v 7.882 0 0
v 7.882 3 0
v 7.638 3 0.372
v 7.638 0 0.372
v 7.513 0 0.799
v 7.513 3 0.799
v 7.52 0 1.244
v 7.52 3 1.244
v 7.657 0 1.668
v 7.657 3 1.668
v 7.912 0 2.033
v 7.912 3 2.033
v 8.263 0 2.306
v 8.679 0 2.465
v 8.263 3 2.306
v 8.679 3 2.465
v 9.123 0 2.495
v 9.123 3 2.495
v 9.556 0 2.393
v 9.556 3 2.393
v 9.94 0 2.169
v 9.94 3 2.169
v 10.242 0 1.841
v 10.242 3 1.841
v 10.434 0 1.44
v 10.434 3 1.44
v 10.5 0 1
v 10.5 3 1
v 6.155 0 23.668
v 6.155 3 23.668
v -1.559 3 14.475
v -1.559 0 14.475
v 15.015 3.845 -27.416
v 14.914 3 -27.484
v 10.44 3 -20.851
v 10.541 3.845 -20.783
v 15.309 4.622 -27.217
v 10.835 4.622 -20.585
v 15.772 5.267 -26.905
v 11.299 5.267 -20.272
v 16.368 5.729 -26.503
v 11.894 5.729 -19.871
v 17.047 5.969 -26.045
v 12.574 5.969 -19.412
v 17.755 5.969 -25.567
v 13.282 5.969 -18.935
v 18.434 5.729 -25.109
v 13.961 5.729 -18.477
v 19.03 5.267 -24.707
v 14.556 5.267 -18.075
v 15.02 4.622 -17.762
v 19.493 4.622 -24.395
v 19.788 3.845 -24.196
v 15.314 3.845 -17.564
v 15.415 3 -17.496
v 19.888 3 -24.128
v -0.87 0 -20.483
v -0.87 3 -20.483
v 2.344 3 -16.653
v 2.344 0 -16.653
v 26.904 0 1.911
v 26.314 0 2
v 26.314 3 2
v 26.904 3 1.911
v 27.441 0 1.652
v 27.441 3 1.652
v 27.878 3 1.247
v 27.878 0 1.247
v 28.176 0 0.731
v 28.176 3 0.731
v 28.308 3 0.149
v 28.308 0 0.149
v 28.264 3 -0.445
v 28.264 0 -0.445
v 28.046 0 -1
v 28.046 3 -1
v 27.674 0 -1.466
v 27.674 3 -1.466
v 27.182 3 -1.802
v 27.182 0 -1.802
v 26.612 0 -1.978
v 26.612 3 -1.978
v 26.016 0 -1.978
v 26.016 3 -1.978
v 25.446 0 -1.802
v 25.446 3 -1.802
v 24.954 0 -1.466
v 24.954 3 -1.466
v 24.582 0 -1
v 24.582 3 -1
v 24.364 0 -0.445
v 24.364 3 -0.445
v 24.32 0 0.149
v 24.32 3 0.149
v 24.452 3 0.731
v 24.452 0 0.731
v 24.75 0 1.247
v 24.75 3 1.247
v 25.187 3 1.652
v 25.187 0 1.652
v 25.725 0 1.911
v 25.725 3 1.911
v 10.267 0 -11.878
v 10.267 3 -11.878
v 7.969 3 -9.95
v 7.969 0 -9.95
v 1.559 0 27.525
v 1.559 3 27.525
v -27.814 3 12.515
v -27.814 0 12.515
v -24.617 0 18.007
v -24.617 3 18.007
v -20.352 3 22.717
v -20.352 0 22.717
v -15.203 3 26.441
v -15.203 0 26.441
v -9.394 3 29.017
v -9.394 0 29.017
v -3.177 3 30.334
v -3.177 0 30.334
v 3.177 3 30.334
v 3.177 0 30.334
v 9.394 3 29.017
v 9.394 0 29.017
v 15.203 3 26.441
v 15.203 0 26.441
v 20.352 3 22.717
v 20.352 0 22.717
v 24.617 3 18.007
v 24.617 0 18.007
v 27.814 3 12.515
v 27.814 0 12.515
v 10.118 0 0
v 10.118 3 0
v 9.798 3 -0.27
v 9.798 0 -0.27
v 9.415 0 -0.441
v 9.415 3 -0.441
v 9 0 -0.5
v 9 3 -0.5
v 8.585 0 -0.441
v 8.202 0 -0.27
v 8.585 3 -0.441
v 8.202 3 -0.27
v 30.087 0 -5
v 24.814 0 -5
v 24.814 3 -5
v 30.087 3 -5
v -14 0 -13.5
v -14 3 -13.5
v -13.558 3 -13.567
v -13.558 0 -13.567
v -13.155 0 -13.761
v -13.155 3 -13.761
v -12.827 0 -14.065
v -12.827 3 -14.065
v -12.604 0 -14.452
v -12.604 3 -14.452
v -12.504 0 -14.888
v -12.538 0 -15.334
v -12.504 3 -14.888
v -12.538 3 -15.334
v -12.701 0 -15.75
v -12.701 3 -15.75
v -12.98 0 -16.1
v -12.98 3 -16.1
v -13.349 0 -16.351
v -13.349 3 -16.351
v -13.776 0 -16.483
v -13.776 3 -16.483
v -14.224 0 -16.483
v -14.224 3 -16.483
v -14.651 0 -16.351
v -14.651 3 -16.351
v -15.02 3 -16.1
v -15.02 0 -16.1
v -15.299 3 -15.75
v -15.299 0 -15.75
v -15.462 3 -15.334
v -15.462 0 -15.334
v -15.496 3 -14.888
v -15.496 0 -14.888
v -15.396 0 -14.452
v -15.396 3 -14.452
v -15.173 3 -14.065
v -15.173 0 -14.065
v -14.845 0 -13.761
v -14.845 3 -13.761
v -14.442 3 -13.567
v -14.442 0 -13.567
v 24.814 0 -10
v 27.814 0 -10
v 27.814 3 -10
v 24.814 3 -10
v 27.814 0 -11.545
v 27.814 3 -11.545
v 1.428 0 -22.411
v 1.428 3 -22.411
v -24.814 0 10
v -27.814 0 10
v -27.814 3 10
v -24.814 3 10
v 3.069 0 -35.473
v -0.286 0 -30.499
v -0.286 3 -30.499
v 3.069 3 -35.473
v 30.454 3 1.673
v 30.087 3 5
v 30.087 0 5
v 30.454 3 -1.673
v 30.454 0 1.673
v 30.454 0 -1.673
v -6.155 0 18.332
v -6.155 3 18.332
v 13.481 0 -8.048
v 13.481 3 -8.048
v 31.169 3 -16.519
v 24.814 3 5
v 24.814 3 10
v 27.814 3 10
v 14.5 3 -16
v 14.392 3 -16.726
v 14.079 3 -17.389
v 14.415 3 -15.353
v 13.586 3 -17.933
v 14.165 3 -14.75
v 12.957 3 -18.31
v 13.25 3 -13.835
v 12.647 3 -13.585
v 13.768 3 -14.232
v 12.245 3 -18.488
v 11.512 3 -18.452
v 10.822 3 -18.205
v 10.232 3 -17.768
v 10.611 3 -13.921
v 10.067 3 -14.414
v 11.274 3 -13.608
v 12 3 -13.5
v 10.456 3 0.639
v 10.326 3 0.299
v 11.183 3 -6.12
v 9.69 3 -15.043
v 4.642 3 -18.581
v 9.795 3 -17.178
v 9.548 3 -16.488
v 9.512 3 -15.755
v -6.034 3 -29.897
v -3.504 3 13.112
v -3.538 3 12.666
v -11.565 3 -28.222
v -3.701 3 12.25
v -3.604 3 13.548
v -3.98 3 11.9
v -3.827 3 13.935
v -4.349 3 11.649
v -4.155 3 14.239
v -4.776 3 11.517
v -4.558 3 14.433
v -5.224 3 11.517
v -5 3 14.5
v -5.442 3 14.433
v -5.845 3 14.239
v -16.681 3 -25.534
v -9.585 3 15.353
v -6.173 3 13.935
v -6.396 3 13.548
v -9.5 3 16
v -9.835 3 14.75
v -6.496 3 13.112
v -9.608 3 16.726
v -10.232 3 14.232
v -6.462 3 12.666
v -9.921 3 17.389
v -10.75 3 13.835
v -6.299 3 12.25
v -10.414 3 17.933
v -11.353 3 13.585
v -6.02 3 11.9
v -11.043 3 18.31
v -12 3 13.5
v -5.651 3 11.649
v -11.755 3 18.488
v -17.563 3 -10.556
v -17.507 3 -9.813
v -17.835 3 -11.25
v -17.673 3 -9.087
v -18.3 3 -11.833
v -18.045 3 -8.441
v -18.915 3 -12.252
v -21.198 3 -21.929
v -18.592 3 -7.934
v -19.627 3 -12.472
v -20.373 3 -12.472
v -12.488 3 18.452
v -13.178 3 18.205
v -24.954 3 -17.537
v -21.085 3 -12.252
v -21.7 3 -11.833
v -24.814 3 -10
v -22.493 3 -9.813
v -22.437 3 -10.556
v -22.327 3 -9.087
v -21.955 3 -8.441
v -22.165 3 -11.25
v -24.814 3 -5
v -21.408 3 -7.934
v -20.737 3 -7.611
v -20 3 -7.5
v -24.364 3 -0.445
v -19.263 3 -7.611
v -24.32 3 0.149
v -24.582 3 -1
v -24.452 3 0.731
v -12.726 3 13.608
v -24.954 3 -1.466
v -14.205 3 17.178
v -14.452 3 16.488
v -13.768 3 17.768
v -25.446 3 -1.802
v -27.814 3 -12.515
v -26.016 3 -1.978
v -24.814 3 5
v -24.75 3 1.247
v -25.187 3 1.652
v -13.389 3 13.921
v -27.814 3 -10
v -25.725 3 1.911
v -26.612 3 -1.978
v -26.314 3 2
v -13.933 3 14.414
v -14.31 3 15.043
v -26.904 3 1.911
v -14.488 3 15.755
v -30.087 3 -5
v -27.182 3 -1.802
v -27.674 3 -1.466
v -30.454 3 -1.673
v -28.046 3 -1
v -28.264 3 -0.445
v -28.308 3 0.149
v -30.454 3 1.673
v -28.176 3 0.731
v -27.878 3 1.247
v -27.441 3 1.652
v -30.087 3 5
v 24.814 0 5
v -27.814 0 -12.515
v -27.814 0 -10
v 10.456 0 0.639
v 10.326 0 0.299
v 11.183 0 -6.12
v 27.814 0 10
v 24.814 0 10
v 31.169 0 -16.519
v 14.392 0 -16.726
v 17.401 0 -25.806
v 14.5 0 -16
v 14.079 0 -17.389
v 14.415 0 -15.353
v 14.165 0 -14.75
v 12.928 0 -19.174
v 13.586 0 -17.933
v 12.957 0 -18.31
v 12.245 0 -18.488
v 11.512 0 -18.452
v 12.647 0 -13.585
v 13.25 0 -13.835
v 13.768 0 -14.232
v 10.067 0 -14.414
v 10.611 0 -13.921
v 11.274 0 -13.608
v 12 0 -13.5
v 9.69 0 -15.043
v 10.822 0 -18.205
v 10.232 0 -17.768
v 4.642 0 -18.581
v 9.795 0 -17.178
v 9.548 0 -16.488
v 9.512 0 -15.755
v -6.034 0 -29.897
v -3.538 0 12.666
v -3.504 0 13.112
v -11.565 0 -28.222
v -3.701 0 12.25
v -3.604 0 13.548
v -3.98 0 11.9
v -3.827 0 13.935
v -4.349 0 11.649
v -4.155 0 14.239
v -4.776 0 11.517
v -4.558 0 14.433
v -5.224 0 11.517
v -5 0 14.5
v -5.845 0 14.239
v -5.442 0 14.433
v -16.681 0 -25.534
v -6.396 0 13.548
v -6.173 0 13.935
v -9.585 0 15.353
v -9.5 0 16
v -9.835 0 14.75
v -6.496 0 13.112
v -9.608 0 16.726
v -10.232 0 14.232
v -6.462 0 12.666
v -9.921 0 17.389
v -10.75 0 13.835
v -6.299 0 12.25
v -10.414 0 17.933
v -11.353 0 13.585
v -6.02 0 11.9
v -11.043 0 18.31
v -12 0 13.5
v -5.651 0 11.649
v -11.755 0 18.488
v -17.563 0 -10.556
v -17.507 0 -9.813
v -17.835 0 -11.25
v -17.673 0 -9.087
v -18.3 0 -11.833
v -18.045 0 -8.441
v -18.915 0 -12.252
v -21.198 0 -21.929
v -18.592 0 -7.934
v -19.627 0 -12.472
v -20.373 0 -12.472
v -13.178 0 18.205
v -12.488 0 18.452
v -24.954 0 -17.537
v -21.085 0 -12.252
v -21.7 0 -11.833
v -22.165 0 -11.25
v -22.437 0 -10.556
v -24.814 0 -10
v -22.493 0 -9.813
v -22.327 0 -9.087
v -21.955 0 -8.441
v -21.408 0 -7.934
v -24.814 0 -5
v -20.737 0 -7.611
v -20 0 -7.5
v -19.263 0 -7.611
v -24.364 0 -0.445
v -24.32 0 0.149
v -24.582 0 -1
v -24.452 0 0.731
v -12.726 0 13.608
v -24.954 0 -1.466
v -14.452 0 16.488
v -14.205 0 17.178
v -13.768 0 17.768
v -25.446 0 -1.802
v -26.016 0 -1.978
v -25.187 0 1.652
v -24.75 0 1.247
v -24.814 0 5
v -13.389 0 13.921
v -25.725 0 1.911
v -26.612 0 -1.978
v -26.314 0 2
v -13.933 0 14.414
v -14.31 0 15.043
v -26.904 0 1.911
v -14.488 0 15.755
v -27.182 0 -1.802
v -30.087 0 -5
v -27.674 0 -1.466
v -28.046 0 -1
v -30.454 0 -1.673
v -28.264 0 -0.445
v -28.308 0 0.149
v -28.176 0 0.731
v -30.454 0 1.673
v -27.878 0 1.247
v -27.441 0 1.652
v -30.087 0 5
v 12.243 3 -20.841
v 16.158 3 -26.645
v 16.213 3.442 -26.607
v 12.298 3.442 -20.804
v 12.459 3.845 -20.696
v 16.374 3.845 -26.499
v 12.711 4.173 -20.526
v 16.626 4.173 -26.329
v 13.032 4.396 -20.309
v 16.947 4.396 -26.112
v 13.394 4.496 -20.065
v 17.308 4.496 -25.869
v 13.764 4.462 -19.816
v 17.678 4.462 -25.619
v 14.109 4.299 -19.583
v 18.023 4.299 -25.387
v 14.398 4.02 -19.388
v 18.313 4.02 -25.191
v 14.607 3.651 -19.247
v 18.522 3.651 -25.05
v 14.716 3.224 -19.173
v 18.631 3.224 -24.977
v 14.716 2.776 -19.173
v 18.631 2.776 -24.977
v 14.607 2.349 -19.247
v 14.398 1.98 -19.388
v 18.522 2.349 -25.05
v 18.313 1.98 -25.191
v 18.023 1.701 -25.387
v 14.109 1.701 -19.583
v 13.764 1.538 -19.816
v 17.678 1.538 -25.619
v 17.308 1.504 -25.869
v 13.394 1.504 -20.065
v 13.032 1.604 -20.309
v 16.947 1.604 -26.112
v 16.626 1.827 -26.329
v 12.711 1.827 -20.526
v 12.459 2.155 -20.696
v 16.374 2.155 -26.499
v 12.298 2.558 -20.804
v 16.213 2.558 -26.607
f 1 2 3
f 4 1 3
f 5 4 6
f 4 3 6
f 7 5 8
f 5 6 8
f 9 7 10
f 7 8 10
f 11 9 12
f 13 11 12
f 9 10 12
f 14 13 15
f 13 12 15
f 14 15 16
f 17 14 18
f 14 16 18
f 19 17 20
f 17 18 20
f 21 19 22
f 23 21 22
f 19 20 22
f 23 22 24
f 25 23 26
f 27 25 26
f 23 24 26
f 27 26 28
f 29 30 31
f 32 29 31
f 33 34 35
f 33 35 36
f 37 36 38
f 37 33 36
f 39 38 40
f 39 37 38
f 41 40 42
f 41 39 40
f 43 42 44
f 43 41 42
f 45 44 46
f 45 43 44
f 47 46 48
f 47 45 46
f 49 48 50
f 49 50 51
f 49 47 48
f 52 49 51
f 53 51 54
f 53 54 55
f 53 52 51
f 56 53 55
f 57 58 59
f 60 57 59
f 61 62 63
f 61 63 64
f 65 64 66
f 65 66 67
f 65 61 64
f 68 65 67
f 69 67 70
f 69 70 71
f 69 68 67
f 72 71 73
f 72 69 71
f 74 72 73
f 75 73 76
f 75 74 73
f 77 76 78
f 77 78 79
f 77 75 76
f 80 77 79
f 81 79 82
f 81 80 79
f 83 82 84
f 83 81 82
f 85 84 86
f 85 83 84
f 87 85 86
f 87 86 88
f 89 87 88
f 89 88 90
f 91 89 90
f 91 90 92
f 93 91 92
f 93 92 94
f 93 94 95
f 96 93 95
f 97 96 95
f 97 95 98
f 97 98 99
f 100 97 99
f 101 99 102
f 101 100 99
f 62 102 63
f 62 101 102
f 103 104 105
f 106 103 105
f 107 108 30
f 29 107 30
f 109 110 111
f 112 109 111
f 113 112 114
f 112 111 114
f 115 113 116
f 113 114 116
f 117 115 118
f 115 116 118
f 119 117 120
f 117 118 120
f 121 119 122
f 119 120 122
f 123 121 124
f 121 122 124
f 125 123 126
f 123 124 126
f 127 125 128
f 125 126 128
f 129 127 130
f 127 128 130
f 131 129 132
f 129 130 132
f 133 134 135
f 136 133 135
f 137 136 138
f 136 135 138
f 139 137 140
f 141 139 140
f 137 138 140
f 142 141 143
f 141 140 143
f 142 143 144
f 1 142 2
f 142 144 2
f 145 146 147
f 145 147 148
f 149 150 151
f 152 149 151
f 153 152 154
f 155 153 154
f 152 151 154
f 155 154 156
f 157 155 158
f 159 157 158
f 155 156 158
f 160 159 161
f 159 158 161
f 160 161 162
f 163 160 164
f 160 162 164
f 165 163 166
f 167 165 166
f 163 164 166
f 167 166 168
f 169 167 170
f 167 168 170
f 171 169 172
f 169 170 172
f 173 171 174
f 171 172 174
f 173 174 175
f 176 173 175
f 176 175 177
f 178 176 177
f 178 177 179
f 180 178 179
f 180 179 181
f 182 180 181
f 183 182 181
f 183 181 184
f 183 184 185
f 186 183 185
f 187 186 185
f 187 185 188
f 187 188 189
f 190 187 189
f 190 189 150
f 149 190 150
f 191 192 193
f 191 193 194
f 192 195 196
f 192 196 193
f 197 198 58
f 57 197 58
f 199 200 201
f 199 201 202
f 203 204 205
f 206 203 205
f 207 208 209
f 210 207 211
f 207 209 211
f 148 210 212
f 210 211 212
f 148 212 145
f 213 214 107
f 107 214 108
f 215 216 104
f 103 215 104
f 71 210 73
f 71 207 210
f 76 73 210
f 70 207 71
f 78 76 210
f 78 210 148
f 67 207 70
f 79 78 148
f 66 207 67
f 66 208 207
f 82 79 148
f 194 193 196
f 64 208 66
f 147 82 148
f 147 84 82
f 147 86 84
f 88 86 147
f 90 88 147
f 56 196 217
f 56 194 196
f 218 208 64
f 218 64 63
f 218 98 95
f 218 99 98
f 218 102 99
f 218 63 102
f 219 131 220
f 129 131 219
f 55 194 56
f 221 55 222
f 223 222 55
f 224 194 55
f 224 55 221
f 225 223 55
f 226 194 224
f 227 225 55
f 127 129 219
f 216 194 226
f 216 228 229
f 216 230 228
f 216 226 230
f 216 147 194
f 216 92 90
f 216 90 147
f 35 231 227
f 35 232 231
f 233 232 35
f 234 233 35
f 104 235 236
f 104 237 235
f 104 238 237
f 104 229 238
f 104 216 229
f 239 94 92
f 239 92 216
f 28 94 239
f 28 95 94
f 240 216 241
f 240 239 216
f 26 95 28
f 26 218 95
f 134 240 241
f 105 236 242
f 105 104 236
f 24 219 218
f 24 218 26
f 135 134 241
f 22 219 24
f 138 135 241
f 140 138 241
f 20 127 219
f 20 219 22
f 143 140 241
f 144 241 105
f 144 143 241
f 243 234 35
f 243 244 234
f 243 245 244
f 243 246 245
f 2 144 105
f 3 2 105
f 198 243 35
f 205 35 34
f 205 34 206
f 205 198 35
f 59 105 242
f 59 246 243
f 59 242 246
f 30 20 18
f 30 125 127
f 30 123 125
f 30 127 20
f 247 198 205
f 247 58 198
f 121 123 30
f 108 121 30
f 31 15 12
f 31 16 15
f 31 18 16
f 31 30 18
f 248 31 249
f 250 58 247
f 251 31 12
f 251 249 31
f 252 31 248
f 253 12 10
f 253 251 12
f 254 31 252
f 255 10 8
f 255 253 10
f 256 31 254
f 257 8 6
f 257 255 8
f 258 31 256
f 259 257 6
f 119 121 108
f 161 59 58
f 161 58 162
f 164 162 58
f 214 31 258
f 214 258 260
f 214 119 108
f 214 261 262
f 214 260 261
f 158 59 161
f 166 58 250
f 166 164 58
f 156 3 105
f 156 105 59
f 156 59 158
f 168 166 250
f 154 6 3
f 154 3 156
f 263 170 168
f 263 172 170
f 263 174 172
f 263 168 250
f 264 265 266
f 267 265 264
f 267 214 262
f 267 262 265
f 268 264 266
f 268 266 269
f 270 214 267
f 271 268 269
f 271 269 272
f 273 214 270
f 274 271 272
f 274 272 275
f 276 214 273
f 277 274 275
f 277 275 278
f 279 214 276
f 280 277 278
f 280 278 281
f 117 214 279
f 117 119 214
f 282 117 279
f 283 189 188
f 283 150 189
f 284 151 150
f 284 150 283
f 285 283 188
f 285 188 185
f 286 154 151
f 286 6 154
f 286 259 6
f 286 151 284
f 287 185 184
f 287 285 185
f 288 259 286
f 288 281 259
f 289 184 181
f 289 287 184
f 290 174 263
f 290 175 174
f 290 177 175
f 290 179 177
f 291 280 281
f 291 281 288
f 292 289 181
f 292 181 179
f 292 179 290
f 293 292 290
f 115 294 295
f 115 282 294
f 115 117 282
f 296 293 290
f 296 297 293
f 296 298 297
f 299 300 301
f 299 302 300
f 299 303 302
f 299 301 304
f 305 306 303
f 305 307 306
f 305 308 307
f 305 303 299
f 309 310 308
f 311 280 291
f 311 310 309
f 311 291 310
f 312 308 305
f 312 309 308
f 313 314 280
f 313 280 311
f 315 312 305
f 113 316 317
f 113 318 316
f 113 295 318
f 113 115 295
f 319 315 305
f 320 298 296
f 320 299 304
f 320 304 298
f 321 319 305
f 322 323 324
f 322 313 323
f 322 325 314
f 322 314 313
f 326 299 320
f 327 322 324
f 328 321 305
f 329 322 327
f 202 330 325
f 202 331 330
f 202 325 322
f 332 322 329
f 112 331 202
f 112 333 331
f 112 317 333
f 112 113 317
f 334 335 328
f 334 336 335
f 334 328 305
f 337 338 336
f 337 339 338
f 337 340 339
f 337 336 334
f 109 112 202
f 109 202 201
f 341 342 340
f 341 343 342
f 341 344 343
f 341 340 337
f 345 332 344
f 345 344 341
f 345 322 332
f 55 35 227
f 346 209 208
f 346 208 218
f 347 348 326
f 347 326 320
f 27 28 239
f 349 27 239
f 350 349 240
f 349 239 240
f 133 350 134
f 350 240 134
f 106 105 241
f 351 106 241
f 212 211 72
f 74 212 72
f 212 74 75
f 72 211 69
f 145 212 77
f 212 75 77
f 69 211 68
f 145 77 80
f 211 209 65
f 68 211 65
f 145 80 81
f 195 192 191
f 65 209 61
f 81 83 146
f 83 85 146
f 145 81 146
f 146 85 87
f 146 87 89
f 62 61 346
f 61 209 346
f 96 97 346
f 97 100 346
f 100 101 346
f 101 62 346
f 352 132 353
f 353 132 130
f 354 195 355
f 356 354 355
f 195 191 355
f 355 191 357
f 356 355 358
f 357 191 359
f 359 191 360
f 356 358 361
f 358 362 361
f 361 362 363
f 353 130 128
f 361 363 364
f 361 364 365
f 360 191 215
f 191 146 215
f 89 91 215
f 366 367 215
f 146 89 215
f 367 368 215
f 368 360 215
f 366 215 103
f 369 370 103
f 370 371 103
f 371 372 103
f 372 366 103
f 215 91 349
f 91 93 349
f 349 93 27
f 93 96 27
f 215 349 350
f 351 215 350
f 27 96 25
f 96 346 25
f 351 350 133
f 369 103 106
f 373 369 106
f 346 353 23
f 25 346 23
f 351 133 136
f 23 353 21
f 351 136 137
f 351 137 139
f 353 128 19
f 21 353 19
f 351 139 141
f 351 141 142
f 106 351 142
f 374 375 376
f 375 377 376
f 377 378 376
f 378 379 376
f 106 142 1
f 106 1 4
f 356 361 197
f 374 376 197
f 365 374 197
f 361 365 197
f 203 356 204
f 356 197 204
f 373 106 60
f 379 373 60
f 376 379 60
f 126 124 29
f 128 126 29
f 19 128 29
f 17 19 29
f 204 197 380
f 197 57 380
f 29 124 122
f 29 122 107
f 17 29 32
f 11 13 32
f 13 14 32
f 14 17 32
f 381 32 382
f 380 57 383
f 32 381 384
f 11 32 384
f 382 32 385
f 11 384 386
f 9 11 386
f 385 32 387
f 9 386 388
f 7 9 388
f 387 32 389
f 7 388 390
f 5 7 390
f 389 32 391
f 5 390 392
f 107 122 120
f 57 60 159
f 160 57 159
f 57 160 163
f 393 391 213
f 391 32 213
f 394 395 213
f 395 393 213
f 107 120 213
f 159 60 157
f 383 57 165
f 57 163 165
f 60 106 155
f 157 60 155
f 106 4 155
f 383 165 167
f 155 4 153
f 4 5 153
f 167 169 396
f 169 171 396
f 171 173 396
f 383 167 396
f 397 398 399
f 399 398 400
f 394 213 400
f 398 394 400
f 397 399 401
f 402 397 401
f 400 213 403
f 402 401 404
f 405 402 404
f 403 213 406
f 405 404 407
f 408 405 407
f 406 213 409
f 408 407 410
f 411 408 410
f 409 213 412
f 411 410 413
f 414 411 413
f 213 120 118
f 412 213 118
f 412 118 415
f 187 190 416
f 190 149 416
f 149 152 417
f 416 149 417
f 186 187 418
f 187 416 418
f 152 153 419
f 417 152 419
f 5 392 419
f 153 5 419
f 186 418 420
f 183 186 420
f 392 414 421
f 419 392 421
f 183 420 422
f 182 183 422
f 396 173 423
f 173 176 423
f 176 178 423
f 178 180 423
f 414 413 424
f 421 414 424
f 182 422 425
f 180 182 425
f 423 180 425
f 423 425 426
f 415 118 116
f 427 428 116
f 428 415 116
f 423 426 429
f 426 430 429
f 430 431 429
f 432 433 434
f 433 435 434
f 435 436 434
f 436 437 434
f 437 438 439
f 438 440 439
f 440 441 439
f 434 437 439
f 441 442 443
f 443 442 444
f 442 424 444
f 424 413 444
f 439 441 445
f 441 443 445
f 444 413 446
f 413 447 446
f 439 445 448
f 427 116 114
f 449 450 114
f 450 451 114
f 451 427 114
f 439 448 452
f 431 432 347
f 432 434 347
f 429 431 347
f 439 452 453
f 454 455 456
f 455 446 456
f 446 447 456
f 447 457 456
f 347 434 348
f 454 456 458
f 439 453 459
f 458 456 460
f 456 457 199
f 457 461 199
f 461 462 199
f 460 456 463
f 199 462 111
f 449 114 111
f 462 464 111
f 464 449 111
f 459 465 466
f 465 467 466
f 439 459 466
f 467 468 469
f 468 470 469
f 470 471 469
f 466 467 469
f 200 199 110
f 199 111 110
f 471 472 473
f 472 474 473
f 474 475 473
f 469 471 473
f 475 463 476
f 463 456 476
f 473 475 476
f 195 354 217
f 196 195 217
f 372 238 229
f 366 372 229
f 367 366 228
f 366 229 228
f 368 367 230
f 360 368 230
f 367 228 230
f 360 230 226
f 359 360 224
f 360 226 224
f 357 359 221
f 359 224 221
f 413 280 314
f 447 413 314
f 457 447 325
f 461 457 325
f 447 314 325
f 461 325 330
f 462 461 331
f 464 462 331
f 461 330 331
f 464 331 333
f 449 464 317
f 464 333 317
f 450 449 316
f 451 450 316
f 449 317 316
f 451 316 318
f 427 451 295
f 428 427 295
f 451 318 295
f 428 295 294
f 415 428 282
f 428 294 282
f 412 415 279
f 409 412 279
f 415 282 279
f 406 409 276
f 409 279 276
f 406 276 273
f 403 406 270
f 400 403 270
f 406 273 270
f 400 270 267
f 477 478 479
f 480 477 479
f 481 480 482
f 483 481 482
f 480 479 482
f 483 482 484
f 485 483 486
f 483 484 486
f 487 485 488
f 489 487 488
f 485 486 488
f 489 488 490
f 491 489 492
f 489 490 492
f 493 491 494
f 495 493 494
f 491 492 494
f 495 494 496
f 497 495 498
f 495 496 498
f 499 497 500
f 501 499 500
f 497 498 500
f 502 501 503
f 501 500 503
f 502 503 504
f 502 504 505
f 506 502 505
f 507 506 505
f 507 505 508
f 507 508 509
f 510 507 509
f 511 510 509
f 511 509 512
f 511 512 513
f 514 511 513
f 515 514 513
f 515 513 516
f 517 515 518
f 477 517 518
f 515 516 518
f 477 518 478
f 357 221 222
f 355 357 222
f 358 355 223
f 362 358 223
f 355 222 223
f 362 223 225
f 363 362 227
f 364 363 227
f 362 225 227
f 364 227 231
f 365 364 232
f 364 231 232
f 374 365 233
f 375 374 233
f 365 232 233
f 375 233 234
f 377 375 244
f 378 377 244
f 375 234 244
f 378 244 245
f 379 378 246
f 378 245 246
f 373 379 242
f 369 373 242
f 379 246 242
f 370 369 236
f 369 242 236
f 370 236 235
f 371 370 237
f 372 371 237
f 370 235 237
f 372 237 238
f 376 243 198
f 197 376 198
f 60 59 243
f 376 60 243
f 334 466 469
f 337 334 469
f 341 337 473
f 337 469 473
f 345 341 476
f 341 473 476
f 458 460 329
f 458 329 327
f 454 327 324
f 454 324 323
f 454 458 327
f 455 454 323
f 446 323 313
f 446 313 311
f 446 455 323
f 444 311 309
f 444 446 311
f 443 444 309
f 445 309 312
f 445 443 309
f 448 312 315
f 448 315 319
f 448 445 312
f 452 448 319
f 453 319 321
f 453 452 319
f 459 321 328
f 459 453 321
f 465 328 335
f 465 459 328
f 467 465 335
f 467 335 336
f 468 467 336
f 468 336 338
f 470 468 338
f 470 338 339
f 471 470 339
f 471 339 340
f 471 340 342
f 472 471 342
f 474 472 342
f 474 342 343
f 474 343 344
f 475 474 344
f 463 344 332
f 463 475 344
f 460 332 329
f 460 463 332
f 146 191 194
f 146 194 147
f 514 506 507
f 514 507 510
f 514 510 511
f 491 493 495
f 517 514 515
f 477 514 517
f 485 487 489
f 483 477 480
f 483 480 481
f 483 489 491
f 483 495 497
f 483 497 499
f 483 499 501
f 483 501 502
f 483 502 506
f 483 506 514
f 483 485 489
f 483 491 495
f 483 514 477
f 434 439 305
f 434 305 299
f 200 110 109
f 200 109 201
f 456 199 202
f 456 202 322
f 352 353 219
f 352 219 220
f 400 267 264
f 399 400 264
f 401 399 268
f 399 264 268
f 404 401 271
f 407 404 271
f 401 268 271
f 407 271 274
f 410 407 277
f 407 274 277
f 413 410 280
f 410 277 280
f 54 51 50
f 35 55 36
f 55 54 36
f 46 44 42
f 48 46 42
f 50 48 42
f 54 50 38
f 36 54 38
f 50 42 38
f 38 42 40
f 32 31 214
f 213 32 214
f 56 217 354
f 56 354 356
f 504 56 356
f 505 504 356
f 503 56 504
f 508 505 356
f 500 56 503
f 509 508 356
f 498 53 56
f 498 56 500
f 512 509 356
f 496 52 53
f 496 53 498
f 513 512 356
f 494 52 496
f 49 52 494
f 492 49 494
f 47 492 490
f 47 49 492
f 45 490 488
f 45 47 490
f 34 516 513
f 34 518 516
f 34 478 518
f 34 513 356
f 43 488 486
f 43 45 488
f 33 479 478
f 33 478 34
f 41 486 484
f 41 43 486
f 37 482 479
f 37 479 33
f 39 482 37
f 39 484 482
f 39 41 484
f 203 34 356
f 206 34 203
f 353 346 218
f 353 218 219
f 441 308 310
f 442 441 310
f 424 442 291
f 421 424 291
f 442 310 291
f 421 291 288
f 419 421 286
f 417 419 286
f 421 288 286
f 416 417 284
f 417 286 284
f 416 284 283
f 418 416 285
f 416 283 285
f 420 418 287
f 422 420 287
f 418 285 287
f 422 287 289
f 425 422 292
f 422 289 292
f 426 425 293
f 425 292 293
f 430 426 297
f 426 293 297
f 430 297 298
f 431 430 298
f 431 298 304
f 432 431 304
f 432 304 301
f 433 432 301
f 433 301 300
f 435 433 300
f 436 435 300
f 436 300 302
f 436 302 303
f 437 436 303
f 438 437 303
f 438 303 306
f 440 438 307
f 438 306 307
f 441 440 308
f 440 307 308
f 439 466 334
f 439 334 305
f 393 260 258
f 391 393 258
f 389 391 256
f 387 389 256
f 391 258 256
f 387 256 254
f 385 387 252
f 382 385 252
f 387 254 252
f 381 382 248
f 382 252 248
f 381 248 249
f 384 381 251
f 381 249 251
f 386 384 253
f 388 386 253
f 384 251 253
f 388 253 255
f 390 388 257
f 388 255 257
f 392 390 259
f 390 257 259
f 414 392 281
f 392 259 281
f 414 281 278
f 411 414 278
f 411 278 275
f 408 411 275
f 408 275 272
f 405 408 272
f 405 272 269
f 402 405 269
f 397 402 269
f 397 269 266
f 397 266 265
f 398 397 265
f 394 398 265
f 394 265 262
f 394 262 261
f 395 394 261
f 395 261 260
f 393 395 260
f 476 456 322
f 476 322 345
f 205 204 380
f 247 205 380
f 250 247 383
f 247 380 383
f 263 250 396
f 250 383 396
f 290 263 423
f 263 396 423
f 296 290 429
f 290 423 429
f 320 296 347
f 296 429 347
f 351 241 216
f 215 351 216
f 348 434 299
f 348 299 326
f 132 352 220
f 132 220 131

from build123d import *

# Parameters (mm, degrees)
CROQUIS1_R              = 30.5
SALIENTE_EXTRUIR1_DEPTH = 3
CORTAR_EXTRUIR3_START   = -4
CORTAR_EXTRUIR3_DEPTH   = 4
CORTAR_EXTRUIR5_DEPTH   = 4
CROQUIS8_R              = 1.5
CORTAR_EXTRUIR6_DEPTH   = 10
CORTAR_EXTRUIR8_START   = -3
CROQUIS10_R             = 2
CORTAR_EXTRUIR8_DEPTH   = 3
CROQUIS11_R             = 2.5
CORTAR_EXTRUIR9_DEPTH   = 3
CROQUIS13_W             = 33.894616986
CROQUIS13_H             = 3
SALIENTE_EXTRUIR2_DEPTH = 6
CROQUIS14_R             = 3
SALIENTE_EXTRUIR3_DEPTH = 8
CROQUIS17_R             = 1.5
CORTAR_EXTRUIR10_DEPTH  = 7


with BuildPart() as part:
    # Croquis1 → Saliente-Extruir1 (new body)
    with BuildSketch(Plane(origin=(0, 0, 0), x_dir=(1, 0, 0), z_dir=(0, 1, 0))):
        with Locations(Location((0, 0, 0), (0, 0, 270))):
            Circle(CROQUIS1_R)
    extrude(amount=SALIENTE_EXTRUIR1_DEPTH)

    # Croquis5 → Cortar-Extruir3 (cut)
    with BuildSketch(Plane(origin=(0, 3, 0), x_dir=(1, 0, 0), z_dir=(0, 1, 0)).offset(CORTAR_EXTRUIR3_START)):
        with BuildLine():
            Line((28.814059068, 5), (30.087372767, 5))
            ThreePointArc((30.087372767, 5), (29.556634924, 7.526973624), (28.814059068, 10))
            Line((28.814059068, 10), (24.814059068, 10))
            Line((24.814059068, 10), (24.814059068, 5))
            Line((24.814059068, 5), (28.814059068, 5))
        make_face()
        with BuildLine():
            Line((30.087372767, -5), (28.814059068, -5))
            Line((28.814059068, -5), (24.814059068, -5))
            Line((24.814059068, -5), (24.814059068, -10))
            Line((24.814059068, -10), (28.814059068, -10))
            ThreePointArc((28.814059068, -10), (29.556634924, -7.526973624), (30.087372767, -5))
        make_face()
        with BuildLine():
            Line((-24.814059068, 5), (-24.814059068, 10))
            Line((-24.814059068, 10), (-28.814059068, 10))
            ThreePointArc((-28.814059068, 10), (-29.556634924, 7.526973624), (-30.087372767, 5))
            Line((-30.087372767, 5), (-28.814059068, 5))
            Line((-28.814059068, 5), (-24.814059068, 5))
        make_face()
        with BuildLine():
            Line((-28.814059068, -10), (-24.814059068, -10))
            Line((-24.814059068, -10), (-24.814059068, -5))
            Line((-24.814059068, -5), (-28.814059068, -5))
            Line((-28.814059068, -5), (-30.087372767, -5))
            ThreePointArc((-30.087372767, -5), (-29.556634924, -7.526973624), (-28.814059068, -10))
        make_face()
    extrude(amount=CORTAR_EXTRUIR3_DEPTH, mode=Mode.SUBTRACT)

    # Croquis7 → Cortar-Extruir5 (cut)
    with BuildSketch(Plane(origin=(0, 3, 0), x_dir=(1, 0, 0), z_dir=(0, 1, 0))):
        Polygon((1.428390211, 22.411430151), (-0.869743118, 20.483067322), (2.34419493, 16.652845106), (4.642328259, 18.581207935), align=None)
        Polygon((10.266719844, 11.878319058), (7.968586515, 9.949956229), (9.575555539, 8.034845121), (11.182524563, 6.119734013), (13.480657893, 8.048096842), align=None)
    extrude(amount=-CORTAR_EXTRUIR5_DEPTH, mode=Mode.SUBTRACT)

    # Croquis8 → Cortar-Extruir6 (cut)
    with BuildSketch(Plane(origin=(0, 3, 0), x_dir=(1, 0, 0), z_dir=(0, 1, 0))):
        Polygon((-6.154858987, -18.33209617), (1.558592329, -27.524629488), (6.154858987, -23.66790383), (-1.558592329, -14.475370512), align=None)
        with BuildLine():
            ThreePointArc((-9.5, -16), (-10.232233047, -14.232233047), (-12, -13.5))
            ThreePointArc((-12, -13.5), (-13.767766953, -17.767766953), (-9.5, -16))
        make_face()
        with BuildLine():
            ThreePointArc((14.5, 16), (10.232233047, 17.767766953), (12, 13.5))
            ThreePointArc((12, 13.5), (13.767766953, 14.232233047), (14.5, 16))
        make_face()
        with Locations(Location((-14, 15, 0), (0, 0, 270))):
            Circle(CROQUIS8_R)
        with BuildLine():
            Line((10.118033989, 0), (7.881966011, 0))
            ThreePointArc((7.881966011, 0), (8.464766865, -2.401258538), (10.5, -1))
            ThreePointArc((10.5, -1), (10.401258538, -0.464766865), (10.118033989, 0))
        make_face()
        with BuildLine():
            ThreePointArc((10.118033989, 0), (9, 0.5), (7.881966011, 0))
            Line((7.881966011, 0), (10.118033989, 0))
        make_face()
        with Locations(Location((-5, -13, 0), (0, 0, 270))):
            Circle(CROQUIS8_R)
    extrude(amount=-CORTAR_EXTRUIR6_DEPTH, mode=Mode.SUBTRACT)

    # Croquis10 → Cortar-Extruir8 (cut)
    with BuildSketch(Plane(origin=(0, 3, 0), x_dir=(1, 0, 0), z_dir=(0, 1, 0)).offset(CORTAR_EXTRUIR8_START)):
        with BuildLine():
            Line((-27.814059068, -12.515115586), (-27.814059068, -10))
            Line((-27.814059068, -10), (-28.814059068, -10))
            ThreePointArc((-28.814059068, -10), (-28.341972277, -11.268655974), (-27.814059068, -12.515115586))
        make_face()
        with BuildLine():
            Line((-28.814059068, 10), (-27.814059068, 10))
            Line((-27.814059068, 10), (-27.814059068, 12.515115586))
            ThreePointArc((-27.814059068, 12.515115586), (-28.341972277, 11.268655974), (-28.814059068, 10))
        make_face()
        with BuildLine():
            Line((27.814059069, -10), (27.814059069, -12.515115586))
            ThreePointArc((27.814059069, -12.515115586), (28.341972277, -11.268655974), (28.814059068, -10))
            Line((28.814059068, -10), (27.814059069, -10))
        make_face()
        with BuildLine():
            ThreePointArc((28.814059069, 10), (28.341972277, 11.268655974), (27.814059069, 12.515115586))
            Line((27.814059069, 12.515115586), (27.814059069, 10))
            Line((27.814059069, 10), (28.814059069, 10))
        make_face()
        with Locations(Location((-26.314059068, 0, 0), (0, 0, 270))):
            Circle(CROQUIS10_R)
        with Locations(Location((26.314059069, 0, 0), (0, 0, 270))):
            Circle(CROQUIS10_R)
    extrude(amount=CORTAR_EXTRUIR8_DEPTH, mode=Mode.SUBTRACT)

    # Croquis11 → Cortar-Extruir9 (cut)
    with BuildSketch(Plane(origin=(0, 3, 0), x_dir=(1, 0, 0), z_dir=(0, 1, 0))):
        with BuildLine():
            Line((-1.702166058, 31.453976389), (29.801261699, 10.204646058))
            ThreePointArc((29.801261699, 10.204646058), (17.614576459, 26.114683535), (-1.702166058, 31.453976389))
        make_face()
        with Locations(Location((-20, 10, 0), (0, 0, 270))):
            Circle(CROQUIS11_R)
    extrude(amount=-CORTAR_EXTRUIR9_DEPTH, mode=Mode.SUBTRACT)

    # Croquis13 → Saliente-Extruir2 (add)
    with BuildSketch(Plane(origin=(14.04954782, 0, -20.829311224), x_dir=(-0.8290375725550413, 0, -0.5591929034707476), z_dir=(0.5591929034707475, 0, -0.8290375725550412))):
        with Locations((0.344307973, 1.5)):
            Rectangle(CROQUIS13_W, CROQUIS13_H)
    extrude(amount=SALIENTE_EXTRUIR2_DEPTH)

    # Croquis14 → Saliente-Extruir3 (add)
    with BuildSketch(Plane(origin=(17.404705241, 0, -25.803536659), x_dir=(-0.8290375725550413, 0, -0.5591929034707476), z_dir=(0.5591929034707476, 0, -0.8290375725550413))):
        with Locations((0.004307973, 3)):
            Circle(CROQUIS14_R)
    extrude(amount=-SALIENTE_EXTRUIR3_DEPTH)

    # Croquis17 → Cortar-Extruir10 (cut)
    with BuildSketch(Plane(origin=(17.404705241, 0, -25.803536659), x_dir=(-0.8290375725550413, 0, -0.5591929034707476), z_dir=(0.5591929034707476, 0, -0.8290375725550413))):
        with Locations((0.004307973, 3)):
            Circle(CROQUIS17_R)
    extrude(amount=-CORTAR_EXTRUIR10_DEPTH, mode=Mode.SUBTRACT)


solid = part.part
